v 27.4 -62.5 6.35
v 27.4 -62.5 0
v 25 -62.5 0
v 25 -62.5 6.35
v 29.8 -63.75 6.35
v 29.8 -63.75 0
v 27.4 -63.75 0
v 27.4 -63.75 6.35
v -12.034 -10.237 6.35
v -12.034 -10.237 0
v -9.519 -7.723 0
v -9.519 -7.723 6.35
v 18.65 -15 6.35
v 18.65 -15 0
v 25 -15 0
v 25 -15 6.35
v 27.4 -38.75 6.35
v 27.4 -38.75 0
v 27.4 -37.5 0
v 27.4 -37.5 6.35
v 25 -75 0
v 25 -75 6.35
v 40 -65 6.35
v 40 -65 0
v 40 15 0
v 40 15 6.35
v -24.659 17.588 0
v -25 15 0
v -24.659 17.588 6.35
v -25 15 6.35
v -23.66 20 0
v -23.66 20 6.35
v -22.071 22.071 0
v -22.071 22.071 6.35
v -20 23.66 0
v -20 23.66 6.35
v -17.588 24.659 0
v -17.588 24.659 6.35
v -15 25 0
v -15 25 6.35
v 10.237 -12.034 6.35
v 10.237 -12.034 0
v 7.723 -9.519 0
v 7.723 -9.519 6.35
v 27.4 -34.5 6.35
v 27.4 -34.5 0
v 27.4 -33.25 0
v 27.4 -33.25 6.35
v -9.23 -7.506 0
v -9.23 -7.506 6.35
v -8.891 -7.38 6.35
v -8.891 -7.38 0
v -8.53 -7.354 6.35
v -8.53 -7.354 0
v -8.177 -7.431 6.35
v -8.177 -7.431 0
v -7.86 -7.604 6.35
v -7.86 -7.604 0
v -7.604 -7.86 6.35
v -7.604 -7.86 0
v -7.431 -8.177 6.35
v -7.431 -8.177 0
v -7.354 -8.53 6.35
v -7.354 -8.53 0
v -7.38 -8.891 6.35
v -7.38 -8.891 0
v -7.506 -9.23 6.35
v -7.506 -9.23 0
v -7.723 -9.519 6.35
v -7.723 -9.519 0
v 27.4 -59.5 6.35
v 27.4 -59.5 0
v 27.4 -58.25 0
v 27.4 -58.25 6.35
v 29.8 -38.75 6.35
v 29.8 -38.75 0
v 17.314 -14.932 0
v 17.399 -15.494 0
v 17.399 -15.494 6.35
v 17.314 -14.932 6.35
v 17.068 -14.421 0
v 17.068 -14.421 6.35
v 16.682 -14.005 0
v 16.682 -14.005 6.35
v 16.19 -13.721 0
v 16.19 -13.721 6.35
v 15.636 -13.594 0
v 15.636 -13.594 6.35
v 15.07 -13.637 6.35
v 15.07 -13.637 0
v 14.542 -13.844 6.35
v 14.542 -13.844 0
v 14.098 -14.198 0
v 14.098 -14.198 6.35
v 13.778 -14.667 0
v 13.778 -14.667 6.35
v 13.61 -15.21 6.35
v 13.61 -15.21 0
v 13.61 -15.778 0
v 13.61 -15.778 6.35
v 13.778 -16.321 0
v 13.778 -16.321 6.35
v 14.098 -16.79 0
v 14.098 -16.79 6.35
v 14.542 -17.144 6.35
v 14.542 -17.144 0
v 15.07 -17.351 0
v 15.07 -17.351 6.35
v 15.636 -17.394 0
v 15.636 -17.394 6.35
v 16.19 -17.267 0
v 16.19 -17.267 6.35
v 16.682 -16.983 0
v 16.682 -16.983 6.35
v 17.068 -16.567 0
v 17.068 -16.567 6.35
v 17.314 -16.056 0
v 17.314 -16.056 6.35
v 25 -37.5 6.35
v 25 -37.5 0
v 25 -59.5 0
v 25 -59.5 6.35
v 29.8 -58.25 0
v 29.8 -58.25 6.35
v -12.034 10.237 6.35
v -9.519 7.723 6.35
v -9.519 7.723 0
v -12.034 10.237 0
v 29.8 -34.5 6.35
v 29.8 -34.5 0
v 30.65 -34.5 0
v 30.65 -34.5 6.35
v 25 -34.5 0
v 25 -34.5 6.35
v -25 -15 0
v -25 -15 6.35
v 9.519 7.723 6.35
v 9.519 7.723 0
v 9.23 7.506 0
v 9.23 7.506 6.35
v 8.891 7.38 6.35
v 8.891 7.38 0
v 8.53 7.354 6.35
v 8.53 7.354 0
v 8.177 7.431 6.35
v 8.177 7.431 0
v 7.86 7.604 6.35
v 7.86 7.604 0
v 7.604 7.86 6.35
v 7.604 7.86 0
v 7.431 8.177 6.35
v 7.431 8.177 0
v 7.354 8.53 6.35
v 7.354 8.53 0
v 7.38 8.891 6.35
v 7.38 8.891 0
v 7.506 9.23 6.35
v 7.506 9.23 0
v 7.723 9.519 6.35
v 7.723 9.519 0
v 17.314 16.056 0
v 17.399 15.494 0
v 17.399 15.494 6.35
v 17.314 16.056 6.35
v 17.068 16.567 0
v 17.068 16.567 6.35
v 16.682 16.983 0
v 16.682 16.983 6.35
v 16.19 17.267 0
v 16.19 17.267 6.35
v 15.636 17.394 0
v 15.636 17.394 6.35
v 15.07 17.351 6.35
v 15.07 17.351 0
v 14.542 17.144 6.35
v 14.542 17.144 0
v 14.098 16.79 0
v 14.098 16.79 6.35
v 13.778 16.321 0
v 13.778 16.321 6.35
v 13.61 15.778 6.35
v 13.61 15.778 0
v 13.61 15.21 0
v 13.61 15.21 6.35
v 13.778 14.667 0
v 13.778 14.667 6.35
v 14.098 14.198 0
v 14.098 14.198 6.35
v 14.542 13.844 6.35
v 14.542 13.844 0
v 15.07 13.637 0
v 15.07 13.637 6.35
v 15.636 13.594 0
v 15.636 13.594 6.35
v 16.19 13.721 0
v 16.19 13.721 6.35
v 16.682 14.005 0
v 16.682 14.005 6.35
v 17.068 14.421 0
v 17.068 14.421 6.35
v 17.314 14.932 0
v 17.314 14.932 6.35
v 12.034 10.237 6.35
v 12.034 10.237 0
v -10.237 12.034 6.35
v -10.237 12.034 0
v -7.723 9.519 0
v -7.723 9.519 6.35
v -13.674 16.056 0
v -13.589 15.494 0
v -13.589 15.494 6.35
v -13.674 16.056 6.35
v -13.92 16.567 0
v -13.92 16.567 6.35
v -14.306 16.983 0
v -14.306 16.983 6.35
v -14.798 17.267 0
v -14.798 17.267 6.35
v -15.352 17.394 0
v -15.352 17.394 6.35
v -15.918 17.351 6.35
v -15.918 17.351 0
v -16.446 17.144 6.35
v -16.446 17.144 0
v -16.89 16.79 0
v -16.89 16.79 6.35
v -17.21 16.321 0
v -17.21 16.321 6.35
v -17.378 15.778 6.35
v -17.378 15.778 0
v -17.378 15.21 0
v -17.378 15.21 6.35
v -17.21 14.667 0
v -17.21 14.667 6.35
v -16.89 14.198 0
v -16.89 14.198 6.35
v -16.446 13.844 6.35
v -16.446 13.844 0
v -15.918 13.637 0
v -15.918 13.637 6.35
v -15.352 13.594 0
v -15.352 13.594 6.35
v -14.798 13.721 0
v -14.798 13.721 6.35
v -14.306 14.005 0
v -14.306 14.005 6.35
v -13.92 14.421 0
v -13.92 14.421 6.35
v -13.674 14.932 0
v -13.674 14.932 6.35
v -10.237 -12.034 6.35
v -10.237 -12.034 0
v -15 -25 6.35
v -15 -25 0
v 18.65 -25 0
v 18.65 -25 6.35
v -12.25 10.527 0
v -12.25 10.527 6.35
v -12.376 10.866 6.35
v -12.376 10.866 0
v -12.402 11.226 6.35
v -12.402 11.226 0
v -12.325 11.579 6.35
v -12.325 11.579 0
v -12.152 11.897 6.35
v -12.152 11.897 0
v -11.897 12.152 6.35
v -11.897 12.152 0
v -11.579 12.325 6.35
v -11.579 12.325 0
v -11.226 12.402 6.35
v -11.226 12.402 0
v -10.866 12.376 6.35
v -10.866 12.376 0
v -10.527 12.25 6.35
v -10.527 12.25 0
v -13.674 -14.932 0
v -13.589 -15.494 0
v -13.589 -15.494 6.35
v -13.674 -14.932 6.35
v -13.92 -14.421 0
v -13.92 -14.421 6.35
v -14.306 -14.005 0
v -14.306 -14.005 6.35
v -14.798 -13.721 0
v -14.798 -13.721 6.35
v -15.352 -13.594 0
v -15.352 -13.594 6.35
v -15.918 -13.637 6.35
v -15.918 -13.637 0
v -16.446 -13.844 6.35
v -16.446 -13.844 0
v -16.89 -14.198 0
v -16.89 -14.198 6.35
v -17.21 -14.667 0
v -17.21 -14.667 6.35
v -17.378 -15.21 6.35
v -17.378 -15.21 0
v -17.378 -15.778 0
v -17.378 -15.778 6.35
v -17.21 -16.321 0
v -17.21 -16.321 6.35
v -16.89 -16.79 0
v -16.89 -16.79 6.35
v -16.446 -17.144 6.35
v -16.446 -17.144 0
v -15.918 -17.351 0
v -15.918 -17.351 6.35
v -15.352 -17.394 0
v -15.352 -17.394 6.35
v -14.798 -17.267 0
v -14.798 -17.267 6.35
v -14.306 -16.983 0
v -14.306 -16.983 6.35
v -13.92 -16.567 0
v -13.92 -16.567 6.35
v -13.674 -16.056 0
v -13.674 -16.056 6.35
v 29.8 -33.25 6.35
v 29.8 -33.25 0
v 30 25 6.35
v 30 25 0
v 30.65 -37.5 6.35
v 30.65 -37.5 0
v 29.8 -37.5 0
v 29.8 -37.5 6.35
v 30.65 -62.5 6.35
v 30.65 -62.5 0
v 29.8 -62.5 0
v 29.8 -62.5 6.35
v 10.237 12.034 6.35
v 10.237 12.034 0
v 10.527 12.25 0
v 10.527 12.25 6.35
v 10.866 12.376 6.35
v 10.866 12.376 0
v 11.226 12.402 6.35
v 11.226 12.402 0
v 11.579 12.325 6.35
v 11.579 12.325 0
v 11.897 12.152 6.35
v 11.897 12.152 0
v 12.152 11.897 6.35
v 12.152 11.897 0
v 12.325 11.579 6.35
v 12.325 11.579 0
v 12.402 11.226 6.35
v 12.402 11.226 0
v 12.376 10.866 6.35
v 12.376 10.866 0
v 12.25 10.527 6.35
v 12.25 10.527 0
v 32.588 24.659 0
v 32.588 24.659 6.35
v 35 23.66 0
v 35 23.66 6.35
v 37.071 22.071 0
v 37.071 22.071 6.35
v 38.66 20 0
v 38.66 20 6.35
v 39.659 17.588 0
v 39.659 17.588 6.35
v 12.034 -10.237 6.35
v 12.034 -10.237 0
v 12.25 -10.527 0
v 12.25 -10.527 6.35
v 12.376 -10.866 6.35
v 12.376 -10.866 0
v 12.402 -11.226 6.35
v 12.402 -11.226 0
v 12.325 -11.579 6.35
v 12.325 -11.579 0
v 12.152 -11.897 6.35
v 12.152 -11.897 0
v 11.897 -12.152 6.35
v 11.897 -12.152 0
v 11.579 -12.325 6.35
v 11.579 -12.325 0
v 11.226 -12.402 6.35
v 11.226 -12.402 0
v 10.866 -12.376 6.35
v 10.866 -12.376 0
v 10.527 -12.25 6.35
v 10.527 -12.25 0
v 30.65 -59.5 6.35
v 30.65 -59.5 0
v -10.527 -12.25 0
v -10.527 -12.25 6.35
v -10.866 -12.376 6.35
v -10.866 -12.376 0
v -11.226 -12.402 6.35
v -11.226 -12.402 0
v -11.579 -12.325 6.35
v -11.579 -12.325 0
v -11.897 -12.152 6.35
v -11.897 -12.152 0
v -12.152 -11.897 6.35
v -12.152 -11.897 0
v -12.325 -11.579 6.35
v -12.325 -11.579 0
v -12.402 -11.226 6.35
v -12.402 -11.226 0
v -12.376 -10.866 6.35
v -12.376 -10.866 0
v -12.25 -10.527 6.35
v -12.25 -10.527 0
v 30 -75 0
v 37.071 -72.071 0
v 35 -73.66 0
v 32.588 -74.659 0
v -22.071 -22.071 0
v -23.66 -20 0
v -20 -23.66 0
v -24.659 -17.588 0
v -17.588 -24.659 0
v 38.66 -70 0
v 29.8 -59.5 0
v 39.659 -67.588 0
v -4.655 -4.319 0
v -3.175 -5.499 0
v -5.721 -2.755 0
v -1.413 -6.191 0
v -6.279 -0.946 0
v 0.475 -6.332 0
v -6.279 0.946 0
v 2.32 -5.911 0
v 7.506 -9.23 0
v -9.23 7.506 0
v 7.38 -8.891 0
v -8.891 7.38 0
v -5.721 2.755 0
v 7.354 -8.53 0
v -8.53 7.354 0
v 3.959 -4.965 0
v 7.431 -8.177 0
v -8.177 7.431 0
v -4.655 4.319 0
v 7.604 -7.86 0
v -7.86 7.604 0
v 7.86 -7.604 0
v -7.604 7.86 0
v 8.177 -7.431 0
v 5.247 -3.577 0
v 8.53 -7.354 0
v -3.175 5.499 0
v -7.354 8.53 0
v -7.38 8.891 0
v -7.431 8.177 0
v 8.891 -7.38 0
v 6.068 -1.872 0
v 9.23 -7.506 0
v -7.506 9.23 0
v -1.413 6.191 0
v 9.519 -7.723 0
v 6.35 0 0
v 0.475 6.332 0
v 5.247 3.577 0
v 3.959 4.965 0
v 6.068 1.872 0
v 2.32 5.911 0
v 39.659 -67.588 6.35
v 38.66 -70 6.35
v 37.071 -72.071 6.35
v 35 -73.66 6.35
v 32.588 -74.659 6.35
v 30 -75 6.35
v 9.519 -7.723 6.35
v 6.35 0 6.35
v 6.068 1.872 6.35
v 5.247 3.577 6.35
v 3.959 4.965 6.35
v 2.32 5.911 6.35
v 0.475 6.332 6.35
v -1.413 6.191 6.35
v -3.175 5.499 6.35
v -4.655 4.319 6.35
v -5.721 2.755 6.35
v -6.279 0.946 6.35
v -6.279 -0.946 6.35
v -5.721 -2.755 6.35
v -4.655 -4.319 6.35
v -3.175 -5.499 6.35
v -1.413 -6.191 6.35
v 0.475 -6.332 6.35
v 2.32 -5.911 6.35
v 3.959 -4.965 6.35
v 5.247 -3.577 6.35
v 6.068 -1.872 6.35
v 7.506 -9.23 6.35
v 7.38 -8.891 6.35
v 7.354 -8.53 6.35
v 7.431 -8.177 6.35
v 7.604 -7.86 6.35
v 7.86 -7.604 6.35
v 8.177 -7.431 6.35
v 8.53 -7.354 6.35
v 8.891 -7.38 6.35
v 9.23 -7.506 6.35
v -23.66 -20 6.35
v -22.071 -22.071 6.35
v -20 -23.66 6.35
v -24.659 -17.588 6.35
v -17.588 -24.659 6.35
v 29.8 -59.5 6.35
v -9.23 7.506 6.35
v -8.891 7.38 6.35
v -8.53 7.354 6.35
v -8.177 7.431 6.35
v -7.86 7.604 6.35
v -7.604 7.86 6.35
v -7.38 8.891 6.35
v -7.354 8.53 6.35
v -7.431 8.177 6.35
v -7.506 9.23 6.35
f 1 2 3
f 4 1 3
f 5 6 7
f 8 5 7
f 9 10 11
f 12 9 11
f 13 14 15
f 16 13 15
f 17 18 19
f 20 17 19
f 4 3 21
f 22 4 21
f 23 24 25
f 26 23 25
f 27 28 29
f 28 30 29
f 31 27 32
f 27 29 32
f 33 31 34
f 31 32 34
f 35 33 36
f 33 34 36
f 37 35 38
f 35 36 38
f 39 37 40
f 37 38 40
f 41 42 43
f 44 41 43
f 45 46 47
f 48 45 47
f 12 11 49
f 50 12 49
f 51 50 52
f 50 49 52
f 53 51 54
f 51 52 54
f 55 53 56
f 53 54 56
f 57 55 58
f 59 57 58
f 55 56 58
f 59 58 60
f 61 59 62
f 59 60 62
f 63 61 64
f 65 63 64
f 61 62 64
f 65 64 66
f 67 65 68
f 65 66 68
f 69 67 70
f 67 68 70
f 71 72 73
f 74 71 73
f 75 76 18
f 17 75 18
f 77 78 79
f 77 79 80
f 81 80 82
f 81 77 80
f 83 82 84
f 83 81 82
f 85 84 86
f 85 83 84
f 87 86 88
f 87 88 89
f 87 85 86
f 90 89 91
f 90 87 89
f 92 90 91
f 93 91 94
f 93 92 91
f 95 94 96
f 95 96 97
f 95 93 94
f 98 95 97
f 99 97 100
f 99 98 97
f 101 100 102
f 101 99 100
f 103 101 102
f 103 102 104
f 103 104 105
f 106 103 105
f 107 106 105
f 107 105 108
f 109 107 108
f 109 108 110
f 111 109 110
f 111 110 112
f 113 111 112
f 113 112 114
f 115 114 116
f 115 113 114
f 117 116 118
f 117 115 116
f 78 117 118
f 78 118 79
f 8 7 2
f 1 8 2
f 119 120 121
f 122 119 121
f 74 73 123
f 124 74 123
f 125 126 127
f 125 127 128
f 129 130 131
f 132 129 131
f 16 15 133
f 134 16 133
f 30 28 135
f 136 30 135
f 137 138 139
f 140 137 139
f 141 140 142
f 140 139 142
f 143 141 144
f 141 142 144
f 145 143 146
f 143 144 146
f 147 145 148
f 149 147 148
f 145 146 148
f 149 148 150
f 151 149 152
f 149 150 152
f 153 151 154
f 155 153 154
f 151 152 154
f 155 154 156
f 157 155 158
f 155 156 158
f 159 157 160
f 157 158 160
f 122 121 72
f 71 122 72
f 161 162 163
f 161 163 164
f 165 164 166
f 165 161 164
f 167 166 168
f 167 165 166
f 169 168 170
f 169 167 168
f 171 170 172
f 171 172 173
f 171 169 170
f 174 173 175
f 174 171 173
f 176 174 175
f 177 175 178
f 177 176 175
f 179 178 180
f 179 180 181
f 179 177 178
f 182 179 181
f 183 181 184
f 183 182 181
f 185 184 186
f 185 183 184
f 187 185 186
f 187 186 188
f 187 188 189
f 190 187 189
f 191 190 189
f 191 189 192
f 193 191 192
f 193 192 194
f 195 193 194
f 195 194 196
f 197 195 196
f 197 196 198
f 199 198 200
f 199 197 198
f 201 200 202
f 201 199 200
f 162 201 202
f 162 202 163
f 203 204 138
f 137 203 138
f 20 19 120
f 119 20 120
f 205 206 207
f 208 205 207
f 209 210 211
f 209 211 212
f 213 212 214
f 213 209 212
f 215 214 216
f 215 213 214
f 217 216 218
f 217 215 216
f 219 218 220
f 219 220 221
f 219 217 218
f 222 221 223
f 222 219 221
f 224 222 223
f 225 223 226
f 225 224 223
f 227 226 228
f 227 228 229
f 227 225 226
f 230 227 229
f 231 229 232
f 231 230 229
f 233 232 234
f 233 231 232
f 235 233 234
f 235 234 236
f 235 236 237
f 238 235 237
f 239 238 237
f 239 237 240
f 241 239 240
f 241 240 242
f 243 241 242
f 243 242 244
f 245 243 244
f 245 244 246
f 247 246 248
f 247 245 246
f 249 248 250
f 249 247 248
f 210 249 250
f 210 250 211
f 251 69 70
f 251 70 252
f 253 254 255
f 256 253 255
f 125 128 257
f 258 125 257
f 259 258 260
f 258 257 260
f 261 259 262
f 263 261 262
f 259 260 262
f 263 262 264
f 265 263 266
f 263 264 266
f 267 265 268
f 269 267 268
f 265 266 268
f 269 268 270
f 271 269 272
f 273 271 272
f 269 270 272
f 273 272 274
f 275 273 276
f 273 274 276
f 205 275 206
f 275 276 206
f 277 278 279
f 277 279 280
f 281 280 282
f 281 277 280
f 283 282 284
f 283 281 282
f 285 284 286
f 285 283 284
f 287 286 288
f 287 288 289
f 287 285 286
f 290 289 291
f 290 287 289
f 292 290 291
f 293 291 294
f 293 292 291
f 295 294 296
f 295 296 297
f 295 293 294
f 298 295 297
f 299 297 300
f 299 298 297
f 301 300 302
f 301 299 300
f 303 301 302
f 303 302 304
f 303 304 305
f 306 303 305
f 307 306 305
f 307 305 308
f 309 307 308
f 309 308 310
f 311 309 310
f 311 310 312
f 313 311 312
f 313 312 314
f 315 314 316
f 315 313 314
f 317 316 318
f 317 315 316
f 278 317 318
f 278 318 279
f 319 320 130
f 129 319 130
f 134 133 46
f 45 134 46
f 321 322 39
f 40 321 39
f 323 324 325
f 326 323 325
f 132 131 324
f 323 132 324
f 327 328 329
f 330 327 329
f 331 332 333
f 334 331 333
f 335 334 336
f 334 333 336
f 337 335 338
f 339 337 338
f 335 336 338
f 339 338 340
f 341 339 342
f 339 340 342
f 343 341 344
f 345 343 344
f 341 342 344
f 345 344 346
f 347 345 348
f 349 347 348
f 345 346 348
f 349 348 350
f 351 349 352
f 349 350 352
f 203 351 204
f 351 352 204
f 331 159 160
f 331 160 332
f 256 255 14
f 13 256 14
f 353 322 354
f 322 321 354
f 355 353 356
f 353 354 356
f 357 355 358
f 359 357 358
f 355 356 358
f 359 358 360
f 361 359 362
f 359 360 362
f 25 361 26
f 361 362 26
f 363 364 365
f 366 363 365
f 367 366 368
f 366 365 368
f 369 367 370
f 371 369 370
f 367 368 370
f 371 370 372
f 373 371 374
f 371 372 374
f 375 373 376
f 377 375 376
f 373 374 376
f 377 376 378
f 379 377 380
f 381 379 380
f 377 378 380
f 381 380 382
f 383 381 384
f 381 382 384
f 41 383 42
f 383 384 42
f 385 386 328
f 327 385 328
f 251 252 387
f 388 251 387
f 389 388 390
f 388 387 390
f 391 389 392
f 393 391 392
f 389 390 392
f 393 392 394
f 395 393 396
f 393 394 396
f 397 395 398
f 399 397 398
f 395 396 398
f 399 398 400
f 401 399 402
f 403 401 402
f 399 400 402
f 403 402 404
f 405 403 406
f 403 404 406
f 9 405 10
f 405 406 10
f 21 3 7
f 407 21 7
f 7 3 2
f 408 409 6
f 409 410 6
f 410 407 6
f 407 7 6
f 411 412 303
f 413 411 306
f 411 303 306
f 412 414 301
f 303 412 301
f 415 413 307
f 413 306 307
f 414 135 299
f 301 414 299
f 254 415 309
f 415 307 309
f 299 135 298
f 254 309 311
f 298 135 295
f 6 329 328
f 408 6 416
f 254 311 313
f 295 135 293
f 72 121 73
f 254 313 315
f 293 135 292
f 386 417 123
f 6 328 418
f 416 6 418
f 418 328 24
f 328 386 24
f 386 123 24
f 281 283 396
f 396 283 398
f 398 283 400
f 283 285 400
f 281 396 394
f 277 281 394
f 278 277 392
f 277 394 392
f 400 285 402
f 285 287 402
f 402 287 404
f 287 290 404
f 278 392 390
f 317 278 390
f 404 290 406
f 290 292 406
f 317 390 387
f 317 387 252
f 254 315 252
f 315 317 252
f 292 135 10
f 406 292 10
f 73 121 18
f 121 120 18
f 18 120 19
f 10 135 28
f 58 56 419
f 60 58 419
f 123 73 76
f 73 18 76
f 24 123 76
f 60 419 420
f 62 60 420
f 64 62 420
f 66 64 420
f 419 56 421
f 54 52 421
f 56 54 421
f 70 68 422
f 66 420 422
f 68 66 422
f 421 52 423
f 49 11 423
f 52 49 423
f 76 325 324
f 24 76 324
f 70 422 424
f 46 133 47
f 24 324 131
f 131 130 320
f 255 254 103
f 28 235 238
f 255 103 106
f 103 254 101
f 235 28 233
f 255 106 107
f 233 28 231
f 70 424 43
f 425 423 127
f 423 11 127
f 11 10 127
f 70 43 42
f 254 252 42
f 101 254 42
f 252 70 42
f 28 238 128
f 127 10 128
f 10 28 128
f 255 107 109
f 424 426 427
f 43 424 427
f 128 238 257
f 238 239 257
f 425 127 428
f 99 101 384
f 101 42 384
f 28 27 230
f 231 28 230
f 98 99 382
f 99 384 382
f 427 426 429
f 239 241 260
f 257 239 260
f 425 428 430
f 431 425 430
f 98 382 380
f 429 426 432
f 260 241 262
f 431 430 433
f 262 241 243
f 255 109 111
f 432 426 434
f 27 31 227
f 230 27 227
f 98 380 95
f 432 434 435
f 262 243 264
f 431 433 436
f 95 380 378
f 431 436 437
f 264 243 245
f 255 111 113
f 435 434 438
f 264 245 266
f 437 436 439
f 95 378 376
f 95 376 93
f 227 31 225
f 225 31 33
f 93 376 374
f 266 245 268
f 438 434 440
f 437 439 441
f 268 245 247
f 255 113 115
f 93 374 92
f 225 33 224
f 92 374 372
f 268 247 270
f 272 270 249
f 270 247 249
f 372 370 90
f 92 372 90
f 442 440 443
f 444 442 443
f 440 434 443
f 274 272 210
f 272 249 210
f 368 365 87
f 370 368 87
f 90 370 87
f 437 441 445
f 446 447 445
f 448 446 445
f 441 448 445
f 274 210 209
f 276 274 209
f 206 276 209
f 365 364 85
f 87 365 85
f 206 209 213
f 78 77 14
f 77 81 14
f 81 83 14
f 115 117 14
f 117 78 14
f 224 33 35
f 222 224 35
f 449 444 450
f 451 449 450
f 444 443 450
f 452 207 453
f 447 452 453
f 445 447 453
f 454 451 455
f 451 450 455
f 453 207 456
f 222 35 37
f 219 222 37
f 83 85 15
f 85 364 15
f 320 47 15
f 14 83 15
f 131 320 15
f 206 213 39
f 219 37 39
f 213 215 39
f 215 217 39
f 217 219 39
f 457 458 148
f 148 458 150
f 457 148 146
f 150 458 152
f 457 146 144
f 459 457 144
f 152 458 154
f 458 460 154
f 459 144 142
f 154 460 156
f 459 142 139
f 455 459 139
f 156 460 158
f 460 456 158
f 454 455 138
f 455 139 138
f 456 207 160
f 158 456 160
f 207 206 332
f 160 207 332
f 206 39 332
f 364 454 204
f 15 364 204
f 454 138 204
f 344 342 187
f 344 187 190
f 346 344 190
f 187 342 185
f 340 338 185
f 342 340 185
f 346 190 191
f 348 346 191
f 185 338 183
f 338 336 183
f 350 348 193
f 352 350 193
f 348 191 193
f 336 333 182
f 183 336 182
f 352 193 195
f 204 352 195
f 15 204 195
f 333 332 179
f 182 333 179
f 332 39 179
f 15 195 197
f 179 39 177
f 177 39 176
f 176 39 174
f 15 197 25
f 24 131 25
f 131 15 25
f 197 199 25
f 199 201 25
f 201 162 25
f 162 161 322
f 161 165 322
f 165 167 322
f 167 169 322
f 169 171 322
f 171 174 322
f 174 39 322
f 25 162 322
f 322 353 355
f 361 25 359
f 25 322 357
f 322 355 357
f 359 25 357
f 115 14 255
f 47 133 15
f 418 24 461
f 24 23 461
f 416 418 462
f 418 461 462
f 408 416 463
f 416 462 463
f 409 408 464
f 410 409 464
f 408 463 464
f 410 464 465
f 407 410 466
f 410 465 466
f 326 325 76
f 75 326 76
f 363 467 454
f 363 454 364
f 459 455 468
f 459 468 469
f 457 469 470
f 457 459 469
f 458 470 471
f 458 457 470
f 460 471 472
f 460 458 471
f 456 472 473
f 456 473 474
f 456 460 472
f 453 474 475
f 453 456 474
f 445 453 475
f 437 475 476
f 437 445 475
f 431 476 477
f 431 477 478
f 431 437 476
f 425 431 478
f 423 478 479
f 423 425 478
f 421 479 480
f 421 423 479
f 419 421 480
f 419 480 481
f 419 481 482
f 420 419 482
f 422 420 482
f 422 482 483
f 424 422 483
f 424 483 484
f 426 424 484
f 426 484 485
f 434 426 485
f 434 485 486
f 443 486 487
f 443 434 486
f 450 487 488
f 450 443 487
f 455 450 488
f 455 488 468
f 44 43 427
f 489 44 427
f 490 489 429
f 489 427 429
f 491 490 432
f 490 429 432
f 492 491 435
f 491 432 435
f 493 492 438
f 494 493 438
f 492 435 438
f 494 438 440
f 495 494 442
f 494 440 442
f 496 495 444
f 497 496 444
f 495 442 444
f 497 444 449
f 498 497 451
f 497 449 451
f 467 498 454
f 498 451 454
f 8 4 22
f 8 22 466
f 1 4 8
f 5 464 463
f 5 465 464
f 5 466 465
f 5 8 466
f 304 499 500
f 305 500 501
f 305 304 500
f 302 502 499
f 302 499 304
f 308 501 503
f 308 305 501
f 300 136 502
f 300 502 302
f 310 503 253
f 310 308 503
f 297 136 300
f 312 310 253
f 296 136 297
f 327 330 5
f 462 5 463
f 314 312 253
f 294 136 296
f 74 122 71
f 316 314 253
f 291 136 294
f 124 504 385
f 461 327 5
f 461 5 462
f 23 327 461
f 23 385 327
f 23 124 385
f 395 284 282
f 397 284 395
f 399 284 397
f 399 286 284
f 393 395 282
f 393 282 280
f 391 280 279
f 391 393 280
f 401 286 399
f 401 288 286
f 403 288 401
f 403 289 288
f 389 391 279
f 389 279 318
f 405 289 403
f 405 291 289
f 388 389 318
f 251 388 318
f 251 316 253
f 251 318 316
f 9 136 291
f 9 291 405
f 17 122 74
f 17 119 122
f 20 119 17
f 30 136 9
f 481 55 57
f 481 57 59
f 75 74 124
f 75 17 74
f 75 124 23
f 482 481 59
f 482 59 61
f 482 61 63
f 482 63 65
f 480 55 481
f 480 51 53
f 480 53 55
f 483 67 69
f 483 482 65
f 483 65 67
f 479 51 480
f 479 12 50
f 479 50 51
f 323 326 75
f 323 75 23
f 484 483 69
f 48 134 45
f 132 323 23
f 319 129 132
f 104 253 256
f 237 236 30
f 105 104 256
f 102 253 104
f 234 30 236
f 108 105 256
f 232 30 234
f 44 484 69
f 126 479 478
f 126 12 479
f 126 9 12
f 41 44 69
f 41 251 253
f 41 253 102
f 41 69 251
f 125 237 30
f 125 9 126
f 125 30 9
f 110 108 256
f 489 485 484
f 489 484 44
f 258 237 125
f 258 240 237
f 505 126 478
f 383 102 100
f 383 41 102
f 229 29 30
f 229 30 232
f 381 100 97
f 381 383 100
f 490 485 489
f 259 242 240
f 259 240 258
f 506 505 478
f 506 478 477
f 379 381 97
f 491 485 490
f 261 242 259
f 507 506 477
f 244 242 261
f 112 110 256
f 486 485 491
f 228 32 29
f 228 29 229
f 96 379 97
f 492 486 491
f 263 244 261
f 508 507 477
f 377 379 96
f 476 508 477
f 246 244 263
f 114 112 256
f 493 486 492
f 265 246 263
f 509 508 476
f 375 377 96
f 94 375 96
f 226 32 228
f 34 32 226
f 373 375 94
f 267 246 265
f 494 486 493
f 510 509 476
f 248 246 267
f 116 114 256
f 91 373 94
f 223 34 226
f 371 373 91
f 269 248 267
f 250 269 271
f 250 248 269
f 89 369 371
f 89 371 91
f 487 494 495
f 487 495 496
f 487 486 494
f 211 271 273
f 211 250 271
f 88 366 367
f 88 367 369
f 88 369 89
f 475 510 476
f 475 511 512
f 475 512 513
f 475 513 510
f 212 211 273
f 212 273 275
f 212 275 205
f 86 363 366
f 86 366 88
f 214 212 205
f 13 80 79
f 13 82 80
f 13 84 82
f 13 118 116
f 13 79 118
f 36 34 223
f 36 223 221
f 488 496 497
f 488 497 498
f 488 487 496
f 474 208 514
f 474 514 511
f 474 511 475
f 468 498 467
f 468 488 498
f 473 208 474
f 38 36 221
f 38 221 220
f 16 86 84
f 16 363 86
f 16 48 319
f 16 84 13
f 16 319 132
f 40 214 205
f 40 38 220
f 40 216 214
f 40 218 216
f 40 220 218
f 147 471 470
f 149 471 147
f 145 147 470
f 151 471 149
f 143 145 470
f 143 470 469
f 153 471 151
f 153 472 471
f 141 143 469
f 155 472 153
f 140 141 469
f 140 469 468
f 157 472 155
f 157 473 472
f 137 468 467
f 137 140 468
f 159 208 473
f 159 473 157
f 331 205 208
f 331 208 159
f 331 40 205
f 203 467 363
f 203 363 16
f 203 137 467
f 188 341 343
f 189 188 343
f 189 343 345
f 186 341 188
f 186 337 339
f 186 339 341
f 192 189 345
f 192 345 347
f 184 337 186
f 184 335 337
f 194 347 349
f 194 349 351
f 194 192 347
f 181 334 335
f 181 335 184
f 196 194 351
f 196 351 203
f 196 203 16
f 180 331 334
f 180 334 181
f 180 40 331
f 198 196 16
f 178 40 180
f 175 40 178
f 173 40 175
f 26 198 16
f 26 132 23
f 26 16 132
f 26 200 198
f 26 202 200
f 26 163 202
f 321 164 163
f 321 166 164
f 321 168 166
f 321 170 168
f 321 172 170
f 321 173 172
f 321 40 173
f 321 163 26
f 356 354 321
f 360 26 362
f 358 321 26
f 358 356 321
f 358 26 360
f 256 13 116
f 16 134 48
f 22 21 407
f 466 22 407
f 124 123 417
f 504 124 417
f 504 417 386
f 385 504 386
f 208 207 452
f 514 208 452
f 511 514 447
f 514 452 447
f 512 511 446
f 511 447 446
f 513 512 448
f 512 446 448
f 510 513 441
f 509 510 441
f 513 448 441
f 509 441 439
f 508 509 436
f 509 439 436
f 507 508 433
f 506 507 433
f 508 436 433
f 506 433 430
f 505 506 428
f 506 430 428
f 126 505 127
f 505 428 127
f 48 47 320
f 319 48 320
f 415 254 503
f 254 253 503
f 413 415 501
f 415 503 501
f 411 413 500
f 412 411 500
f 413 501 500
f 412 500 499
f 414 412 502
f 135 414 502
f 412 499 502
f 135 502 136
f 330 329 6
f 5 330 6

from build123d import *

# Parameters (mm, degrees)
SKETCH1_R           = 1.905
SKETCH1_R_2         = 6.35
BOSS_EXTRUDE1_DEPTH = 6.35
FILLET1_R           = 10


with BuildPart() as part:
    # Sketch1 → Boss-Extrude1 (new body)
    with BuildSketch(Plane.XY):
        Polygon((18.65, -15), (25, -15), (25, -34.5), (27.4, -34.5), (27.4, -33.25), (29.8, -33.25), (29.8, -34.5), (30.65, -34.5), (30.65, -37.5), (29.8, -37.5), (29.8, -38.75), (27.4, -38.75), (27.4, -37.5), (25, -37.5), (25, -59.5), (27.4, -59.5), (27.4, -58.25), (29.8, -58.25), (29.8, -59.5), (30.65, -59.5), (30.65, -62.5), (29.8, -62.5), (29.8, -63.75), (27.4, -63.75), (27.4, -62.5), (25, -62.5), (25, -75), (40, -75), (40, 25), (-25, 25), (-25, -25), (18.65, -25), align=None)
        with Locations((-15.494, -15.494)):
            Circle(SKETCH1_R, mode=Mode.SUBTRACT)
        with BuildLine():
            ThreePointArc((-10.237491978, -12.033543202), (-12.033543202, -12.033543202), (-12.033543202, -10.237491978))
            Line((-12.033543202, -10.237491978), (-9.519071488, -7.723020264))
            ThreePointArc((-9.519071488, -7.723020264), (-7.723020264, -7.723020264), (-7.723020264, -9.519071488))
            Line((-7.723020264, -9.519071488), (-10.237491978, -12.033543202))
        make_face(mode=Mode.SUBTRACT)
        Circle(SKETCH1_R_2, mode=Mode.SUBTRACT)
        with BuildLine():
            ThreePointArc((-12.033543202, 10.237491978), (-12.033543202, 12.033543202), (-10.237491978, 12.033543202))
            Line((-10.237491978, 12.033543202), (-7.723020264, 9.519071488))
            ThreePointArc((-7.723020264, 9.519071488), (-7.723020264, 7.723020264), (-9.519071488, 7.723020264))
            Line((-9.519071488, 7.723020264), (-12.033543202, 10.237491978))
        make_face(mode=Mode.SUBTRACT)
        with Locations((-15.494, 15.494)):
            Circle(SKETCH1_R, mode=Mode.SUBTRACT)
        with Locations((15.494, -15.494)):
            Circle(SKETCH1_R, mode=Mode.SUBTRACT)
        with BuildLine():
            ThreePointArc((12.033543202, -10.237491978), (12.033543202, -12.033543202), (10.237491978, -12.033543202))
            Line((10.237491978, -12.033543202), (7.723020264, -9.519071488))
            ThreePointArc((7.723020264, -9.519071488), (7.723020264, -7.723020264), (9.519071488, -7.723020264))
            Line((9.519071488, -7.723020264), (12.033543202, -10.237491978))
        make_face(mode=Mode.SUBTRACT)
        with BuildLine():
            ThreePointArc((10.237491978, 12.033543202), (12.033543202, 12.033543202), (12.033543202, 10.237491978))
            Line((12.033543202, 10.237491978), (9.519071488, 7.723020264))
            ThreePointArc((9.519071488, 7.723020264), (7.723020264, 7.723020264), (7.723020264, 9.519071488))
            Line((7.723020264, 9.519071488), (10.237491978, 12.033543202))
        make_face(mode=Mode.SUBTRACT)
        with Locations((15.494, 15.494)):
            Circle(SKETCH1_R, mode=Mode.SUBTRACT)
    extrude(amount=BOSS_EXTRUDE1_DEPTH)

    # Fillet1
    fillet1_edges = [part.edges().sort_by_distance(p)[0] for p in [
        (-25, -25, 3.175),
        (-25, 25, 3.175),
        (40, 25, 3.175),
        (40, -75, 3.175),
    ]]
    fillet(fillet1_edges, radius=FILLET1_R)


solid = part.part
